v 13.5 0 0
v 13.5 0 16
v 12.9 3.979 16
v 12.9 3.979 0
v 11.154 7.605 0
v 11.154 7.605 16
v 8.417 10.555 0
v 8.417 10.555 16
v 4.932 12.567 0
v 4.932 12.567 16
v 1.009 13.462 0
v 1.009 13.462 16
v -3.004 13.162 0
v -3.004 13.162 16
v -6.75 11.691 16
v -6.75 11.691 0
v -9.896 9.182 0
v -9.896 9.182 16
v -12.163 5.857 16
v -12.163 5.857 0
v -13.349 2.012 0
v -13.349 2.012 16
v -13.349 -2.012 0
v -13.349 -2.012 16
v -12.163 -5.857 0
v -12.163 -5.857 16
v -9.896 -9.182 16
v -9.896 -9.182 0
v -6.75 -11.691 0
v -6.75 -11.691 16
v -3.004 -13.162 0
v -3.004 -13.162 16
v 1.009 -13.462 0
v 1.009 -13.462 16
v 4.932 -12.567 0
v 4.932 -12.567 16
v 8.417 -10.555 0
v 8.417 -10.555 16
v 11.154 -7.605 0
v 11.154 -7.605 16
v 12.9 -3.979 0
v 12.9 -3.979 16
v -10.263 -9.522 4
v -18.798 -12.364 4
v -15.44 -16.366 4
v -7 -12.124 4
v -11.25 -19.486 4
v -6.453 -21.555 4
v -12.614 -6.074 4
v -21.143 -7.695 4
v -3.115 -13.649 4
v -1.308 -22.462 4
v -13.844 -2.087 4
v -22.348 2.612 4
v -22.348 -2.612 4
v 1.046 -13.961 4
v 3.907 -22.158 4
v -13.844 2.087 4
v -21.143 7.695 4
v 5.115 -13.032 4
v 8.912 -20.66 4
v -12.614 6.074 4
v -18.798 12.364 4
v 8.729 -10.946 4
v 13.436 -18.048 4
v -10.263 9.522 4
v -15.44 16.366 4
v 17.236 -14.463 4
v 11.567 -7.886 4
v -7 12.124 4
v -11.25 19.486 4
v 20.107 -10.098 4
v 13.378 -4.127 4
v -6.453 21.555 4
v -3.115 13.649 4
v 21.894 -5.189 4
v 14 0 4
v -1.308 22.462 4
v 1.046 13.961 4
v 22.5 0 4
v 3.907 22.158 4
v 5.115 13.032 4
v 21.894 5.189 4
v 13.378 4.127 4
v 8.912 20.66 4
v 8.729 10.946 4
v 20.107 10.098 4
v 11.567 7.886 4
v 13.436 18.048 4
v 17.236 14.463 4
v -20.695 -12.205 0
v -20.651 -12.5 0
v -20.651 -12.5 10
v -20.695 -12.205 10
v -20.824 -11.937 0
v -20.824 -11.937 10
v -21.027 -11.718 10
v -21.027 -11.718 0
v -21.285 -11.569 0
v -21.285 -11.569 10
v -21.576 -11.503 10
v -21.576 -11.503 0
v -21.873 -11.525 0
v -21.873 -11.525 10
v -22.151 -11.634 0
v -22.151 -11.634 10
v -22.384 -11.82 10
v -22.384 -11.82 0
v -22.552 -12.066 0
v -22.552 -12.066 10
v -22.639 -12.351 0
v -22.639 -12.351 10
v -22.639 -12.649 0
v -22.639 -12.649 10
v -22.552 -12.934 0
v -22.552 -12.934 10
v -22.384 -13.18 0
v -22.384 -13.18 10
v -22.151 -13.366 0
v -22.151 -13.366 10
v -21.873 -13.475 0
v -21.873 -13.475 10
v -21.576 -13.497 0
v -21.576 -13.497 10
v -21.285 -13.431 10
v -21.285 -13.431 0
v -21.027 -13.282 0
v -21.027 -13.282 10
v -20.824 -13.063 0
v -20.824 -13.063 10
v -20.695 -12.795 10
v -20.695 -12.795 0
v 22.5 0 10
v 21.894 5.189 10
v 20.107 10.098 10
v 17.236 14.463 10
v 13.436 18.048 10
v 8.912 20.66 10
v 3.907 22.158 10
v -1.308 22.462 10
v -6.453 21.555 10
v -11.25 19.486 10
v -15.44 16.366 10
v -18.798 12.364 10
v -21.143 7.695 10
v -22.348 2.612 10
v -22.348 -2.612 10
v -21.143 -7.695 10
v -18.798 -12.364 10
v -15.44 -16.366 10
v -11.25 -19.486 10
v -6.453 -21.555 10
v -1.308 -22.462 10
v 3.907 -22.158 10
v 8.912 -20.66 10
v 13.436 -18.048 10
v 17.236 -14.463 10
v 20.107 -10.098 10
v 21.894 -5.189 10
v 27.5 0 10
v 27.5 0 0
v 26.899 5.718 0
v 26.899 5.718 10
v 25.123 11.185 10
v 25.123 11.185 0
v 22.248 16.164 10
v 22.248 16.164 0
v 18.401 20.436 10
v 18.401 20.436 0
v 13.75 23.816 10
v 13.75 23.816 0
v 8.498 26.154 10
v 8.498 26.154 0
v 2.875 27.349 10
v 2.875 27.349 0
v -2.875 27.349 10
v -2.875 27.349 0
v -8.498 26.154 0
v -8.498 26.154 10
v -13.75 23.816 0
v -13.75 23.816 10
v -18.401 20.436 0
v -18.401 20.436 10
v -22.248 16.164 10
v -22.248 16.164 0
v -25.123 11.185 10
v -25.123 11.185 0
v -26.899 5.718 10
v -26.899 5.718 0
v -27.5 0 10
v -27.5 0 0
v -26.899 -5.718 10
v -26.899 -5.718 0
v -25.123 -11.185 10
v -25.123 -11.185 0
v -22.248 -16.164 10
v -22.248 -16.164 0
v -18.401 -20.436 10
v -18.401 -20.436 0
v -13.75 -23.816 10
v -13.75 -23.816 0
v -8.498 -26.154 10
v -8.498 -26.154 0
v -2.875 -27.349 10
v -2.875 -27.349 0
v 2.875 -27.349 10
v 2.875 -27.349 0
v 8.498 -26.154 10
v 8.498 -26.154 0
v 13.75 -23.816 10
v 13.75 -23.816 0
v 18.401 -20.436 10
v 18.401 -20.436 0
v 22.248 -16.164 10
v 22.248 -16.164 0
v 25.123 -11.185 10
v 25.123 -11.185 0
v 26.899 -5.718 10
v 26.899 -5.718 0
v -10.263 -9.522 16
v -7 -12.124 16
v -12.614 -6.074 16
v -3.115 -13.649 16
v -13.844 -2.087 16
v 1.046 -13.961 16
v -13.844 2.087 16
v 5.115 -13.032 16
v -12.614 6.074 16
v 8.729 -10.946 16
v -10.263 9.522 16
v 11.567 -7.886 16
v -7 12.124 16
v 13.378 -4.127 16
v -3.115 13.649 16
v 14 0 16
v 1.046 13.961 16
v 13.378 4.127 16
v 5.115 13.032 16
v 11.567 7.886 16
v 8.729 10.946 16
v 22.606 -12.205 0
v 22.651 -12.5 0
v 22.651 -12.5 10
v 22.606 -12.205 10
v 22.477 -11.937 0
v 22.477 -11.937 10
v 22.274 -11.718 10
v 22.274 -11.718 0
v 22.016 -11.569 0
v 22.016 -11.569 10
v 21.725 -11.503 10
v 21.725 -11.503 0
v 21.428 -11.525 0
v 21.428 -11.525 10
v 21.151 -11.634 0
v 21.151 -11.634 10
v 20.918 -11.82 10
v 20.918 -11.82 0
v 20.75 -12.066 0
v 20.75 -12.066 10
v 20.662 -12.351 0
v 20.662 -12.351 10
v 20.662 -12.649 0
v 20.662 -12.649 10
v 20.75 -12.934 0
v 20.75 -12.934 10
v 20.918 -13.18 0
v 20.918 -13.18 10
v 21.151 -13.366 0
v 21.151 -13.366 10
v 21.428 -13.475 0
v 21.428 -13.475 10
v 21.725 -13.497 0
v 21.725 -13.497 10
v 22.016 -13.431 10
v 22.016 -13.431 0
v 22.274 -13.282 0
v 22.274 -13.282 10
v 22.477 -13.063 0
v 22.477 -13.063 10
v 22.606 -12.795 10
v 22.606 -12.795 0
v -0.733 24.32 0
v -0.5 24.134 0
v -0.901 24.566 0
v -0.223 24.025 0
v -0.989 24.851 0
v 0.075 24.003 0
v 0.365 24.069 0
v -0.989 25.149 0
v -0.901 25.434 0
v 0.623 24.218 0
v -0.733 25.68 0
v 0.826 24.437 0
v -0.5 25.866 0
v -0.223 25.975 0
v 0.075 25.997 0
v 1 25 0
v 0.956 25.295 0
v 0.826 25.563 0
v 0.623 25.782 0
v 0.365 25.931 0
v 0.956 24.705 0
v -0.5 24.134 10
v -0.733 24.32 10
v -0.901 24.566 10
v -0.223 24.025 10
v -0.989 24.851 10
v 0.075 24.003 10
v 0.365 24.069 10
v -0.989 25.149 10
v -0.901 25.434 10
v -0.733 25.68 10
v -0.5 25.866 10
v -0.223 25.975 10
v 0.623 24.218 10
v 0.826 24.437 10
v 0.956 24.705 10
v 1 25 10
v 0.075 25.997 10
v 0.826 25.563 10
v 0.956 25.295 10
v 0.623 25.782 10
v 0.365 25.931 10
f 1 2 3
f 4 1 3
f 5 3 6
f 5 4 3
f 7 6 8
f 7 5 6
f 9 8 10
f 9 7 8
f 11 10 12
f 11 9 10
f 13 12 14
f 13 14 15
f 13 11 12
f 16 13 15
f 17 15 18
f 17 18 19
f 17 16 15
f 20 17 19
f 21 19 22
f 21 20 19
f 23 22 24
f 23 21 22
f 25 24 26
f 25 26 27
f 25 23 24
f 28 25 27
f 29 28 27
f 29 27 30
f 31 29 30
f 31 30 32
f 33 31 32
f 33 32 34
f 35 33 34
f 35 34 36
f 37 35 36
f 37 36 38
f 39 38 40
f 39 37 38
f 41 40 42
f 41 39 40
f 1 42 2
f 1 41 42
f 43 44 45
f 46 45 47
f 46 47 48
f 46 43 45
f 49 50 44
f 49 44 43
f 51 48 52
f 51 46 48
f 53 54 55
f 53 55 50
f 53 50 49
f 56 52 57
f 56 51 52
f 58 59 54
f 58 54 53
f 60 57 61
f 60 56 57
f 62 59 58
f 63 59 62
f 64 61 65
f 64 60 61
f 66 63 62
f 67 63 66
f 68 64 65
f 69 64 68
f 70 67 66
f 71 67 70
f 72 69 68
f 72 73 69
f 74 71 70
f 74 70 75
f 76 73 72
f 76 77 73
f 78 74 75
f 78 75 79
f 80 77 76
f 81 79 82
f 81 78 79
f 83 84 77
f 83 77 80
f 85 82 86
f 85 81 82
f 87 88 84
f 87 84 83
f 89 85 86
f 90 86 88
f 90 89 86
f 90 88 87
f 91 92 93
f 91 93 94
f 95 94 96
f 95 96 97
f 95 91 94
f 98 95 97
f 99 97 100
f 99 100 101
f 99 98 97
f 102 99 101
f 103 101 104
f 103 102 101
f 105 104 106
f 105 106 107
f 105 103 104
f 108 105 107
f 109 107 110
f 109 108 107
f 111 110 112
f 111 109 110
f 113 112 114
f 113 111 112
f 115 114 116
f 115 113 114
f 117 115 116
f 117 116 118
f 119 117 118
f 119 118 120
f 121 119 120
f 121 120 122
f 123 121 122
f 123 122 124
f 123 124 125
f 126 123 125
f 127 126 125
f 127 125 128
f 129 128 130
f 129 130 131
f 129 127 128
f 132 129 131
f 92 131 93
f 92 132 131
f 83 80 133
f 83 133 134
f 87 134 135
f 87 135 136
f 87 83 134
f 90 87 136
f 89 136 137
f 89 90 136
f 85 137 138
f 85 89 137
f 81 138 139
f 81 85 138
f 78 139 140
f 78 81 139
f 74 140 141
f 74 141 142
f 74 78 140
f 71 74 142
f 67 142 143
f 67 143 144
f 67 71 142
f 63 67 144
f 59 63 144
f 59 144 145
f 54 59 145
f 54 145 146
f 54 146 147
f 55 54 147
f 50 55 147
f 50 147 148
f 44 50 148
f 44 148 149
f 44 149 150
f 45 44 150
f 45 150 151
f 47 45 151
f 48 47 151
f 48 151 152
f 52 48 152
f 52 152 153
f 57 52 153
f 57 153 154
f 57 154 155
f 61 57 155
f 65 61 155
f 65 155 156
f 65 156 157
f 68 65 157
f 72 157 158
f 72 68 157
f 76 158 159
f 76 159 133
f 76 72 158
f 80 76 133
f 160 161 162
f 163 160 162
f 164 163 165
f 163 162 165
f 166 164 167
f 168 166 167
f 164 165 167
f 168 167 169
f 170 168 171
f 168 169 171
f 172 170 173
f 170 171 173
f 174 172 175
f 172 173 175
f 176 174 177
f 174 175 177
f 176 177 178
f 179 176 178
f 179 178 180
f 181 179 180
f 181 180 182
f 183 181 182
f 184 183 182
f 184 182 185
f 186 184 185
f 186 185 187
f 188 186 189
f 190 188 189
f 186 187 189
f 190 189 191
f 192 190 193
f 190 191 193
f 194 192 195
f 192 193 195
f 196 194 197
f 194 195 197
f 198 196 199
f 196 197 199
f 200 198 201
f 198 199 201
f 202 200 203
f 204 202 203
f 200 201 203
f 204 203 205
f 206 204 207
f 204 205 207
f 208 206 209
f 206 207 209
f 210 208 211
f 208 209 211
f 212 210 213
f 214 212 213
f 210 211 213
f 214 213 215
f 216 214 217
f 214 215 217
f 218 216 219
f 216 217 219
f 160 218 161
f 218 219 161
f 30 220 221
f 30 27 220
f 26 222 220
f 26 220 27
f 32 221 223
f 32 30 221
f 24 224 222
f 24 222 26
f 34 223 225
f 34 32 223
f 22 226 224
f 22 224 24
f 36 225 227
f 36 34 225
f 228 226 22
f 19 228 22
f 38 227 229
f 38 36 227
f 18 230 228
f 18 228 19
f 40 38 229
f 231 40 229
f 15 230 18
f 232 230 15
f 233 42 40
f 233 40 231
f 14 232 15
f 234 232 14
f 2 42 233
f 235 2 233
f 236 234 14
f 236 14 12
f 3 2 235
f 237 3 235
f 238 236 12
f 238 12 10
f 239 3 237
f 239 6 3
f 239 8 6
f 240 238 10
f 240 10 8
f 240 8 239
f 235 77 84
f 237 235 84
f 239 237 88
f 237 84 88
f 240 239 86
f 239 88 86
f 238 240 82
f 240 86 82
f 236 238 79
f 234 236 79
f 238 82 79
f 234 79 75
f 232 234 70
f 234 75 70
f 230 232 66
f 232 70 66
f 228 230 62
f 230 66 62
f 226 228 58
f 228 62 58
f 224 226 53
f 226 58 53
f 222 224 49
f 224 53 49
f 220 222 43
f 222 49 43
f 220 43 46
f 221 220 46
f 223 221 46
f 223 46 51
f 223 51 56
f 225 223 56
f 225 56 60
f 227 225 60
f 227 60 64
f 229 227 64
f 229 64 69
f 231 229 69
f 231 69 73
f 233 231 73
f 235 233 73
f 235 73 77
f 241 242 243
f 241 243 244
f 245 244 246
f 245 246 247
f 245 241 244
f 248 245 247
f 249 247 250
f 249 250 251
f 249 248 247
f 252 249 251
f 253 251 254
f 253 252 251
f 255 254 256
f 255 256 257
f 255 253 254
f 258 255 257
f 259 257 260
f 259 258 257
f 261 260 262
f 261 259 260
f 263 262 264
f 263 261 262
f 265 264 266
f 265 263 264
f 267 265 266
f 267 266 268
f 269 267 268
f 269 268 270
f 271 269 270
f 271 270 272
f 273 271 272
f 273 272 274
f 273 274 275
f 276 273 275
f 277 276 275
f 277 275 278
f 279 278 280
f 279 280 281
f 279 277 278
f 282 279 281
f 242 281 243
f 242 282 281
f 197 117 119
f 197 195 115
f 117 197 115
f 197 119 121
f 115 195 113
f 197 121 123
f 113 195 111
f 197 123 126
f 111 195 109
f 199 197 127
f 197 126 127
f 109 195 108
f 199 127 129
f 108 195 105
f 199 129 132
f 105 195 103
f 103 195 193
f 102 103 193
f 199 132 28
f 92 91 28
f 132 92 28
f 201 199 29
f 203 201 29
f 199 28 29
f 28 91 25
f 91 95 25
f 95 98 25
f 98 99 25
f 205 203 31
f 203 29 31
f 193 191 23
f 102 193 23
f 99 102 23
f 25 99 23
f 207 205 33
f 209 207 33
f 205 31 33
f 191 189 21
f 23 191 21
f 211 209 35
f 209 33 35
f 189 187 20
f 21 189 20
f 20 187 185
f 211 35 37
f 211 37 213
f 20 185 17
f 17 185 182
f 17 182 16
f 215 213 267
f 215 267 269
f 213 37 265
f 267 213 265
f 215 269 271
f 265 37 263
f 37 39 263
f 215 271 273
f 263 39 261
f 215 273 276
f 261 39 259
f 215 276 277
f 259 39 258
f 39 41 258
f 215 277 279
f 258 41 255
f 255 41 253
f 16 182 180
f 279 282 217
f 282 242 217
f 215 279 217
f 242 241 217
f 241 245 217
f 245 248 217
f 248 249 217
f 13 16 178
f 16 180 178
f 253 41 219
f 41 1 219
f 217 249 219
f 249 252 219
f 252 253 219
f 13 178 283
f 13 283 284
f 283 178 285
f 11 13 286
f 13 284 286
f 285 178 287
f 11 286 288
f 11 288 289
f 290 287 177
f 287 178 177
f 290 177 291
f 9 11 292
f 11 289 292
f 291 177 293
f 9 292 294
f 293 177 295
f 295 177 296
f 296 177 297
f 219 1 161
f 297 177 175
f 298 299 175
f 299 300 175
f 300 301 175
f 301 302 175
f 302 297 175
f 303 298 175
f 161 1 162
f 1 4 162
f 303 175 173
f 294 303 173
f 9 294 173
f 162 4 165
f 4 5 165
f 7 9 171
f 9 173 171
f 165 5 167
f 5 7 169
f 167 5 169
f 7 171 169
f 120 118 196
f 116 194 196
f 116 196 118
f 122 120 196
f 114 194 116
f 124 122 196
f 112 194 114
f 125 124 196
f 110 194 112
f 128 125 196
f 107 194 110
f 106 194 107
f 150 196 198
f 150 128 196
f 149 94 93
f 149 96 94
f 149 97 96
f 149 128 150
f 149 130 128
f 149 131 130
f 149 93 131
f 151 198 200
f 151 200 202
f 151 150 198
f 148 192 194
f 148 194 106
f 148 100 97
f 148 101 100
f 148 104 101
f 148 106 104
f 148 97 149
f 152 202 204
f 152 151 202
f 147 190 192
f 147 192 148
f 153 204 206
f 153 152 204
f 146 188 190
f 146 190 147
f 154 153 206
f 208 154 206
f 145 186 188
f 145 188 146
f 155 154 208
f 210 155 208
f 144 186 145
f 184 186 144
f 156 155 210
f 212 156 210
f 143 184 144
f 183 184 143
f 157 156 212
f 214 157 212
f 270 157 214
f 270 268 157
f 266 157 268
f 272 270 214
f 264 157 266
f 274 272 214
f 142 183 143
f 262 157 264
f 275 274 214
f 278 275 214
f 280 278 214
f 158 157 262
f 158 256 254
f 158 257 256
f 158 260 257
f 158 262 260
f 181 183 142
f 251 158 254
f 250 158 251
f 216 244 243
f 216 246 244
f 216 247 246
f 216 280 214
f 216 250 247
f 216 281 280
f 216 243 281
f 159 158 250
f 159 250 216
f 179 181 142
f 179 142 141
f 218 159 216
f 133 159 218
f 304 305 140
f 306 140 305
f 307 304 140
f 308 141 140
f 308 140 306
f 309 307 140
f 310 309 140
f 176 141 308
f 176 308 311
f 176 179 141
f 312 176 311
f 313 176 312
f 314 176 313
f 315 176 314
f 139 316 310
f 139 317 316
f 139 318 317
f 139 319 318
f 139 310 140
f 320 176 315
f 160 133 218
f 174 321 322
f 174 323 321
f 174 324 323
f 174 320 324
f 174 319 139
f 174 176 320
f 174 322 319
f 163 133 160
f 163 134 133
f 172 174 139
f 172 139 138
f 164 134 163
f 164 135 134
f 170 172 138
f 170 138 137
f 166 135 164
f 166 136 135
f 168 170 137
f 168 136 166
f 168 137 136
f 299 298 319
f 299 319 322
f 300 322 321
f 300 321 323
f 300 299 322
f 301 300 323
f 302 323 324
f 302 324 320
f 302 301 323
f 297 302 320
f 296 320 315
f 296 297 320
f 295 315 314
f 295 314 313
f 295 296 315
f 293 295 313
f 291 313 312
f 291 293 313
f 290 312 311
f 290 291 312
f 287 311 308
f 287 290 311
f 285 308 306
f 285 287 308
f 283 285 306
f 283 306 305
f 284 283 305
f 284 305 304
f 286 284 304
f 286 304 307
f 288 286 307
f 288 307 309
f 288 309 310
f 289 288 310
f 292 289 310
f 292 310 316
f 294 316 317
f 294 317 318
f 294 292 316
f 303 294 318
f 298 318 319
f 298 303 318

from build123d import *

# Parameters (mm, degrees)
SKETCH_R      = 27.5
SKETCH_R_2    = 22.5
SKETCH_R_3    = 1
PAD_DEPTH     = 10
SKETCH001_R   = 22.5
SKETCH001_R_2 = 14
PAD001_DEPTH  = 4
SKETCH004_R   = 14
SKETCH004_R_2 = 13.5
PAD004_DEPTH  = 16


with BuildPart() as part:
    # Sketch → Pad (new body)
    with BuildSketch(Plane.XY):
        Circle(SKETCH_R)
        Circle(SKETCH_R_2, mode=Mode.SUBTRACT)
        with Locations((0, 25)):
            Circle(SKETCH_R_3, mode=Mode.SUBTRACT)
        with Locations((-21.650635, -12.5)):
            Circle(SKETCH_R_3, mode=Mode.SUBTRACT)
        with Locations((21.650635, -12.5)):
            Circle(SKETCH_R_3, mode=Mode.SUBTRACT)
    extrude(amount=PAD_DEPTH)

    # Sketch001 → Pad001 (join)
    with BuildSketch(Plane.XY):
        Circle(SKETCH001_R)
        Circle(SKETCH001_R_2, mode=Mode.SUBTRACT)
    extrude(amount=PAD001_DEPTH)

    # Sketch004 → Pad004 (join)
    with BuildSketch(Plane.XY):
        Circle(SKETCH004_R)
        Circle(SKETCH004_R_2, mode=Mode.SUBTRACT)
    extrude(amount=PAD004_DEPTH)


solid = part.part
